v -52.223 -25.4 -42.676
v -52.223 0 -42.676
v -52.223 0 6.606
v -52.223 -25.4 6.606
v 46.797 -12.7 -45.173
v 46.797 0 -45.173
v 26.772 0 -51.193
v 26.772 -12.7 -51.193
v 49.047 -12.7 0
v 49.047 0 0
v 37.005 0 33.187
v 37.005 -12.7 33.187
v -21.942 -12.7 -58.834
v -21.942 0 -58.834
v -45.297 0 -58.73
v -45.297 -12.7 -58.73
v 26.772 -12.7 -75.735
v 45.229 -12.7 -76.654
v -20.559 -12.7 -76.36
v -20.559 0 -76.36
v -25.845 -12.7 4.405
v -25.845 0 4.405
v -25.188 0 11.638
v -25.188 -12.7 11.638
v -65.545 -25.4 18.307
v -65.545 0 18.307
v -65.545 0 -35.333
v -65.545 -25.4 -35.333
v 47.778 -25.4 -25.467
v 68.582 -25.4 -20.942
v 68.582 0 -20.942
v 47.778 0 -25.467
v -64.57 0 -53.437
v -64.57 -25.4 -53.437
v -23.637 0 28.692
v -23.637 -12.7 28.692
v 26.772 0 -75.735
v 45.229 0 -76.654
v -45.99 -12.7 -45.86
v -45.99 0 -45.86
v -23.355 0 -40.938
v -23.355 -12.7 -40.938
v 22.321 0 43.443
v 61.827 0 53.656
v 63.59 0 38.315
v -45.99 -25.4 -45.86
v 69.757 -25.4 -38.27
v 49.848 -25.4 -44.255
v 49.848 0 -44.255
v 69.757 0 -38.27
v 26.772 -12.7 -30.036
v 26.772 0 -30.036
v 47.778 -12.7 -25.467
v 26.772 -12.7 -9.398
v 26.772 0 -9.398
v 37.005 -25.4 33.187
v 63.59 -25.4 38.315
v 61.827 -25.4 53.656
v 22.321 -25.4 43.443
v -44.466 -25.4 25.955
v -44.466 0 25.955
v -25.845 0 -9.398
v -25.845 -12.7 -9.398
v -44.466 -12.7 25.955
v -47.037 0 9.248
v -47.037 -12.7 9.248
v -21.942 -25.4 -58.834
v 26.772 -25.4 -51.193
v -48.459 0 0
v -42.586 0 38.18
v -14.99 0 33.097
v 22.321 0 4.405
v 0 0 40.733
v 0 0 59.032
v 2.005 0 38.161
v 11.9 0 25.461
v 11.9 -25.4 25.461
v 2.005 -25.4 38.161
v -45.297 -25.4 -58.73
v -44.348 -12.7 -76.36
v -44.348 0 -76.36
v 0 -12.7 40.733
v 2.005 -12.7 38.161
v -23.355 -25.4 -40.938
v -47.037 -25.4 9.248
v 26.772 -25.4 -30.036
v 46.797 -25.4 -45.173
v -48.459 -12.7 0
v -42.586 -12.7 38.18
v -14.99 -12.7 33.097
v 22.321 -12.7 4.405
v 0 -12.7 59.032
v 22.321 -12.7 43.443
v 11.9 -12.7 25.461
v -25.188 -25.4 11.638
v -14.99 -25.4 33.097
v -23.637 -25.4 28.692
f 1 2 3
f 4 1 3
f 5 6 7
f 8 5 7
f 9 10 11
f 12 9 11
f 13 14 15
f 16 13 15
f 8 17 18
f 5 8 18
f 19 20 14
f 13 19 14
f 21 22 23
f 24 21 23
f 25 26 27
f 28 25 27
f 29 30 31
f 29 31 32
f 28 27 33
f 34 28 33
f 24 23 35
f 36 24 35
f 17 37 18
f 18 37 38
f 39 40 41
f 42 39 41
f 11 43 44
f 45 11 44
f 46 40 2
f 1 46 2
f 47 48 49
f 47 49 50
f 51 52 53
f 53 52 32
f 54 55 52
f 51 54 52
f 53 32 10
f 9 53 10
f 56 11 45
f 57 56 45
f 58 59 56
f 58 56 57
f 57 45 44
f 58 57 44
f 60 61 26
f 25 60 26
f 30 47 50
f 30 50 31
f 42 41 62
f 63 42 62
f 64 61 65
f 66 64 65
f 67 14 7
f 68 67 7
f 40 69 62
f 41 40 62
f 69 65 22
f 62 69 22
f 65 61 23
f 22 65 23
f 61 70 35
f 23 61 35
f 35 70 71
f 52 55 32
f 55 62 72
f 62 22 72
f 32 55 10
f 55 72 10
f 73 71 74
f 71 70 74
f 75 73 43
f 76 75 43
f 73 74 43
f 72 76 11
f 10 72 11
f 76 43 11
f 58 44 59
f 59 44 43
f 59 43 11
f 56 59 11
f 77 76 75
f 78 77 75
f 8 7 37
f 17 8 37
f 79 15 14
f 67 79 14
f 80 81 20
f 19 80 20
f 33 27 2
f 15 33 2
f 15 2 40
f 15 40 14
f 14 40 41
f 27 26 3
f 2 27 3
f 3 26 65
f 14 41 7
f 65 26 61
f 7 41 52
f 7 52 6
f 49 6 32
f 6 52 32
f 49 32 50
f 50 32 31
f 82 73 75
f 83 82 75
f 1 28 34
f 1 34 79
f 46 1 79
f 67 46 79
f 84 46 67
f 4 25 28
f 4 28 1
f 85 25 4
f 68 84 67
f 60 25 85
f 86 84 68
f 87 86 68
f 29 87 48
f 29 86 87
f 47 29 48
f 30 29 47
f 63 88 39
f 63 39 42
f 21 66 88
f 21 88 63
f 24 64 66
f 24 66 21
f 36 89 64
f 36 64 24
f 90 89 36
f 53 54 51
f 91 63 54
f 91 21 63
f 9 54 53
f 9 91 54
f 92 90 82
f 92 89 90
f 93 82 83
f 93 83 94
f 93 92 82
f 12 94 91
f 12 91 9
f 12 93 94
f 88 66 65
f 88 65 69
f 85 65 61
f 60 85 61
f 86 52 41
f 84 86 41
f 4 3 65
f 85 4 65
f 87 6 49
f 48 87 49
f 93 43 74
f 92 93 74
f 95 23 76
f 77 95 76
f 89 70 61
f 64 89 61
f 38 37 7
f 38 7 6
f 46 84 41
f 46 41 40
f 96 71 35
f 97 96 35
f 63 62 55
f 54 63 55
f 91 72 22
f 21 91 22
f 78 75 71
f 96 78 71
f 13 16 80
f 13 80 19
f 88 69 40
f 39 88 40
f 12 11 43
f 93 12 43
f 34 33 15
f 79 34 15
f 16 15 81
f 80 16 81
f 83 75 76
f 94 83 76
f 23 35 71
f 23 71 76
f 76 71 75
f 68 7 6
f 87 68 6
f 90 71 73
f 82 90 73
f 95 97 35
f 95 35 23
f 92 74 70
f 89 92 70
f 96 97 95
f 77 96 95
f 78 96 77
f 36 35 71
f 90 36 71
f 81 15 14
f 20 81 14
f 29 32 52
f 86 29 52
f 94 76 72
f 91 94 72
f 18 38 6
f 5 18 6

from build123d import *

# Parameters (mm, degrees)
F1_DEPTH = 25.4
F2_DEPTH = 12.7


with BuildPart() as f1:
    # F0 (on Front) → F1 (new body)
    with BuildSketch(Plane.XZ):
        Polygon((-52.223038, 6.606058), (-47.036587, 9.248163), (-44.466347, 25.954724), (-65.545018, 18.306712), (-65.545018, -35.333227), (-64.570178, -53.437405), (-45.297006, -58.729837), (-21.942178, -58.833978), (26.771875, -51.19266), (46.796787, -45.172647), (49.848274, -44.25529), (69.757149, -38.270161), (68.582371, -20.94226), (47.778299, -25.466913), (26.771875, -30.035576), (-23.355048, -40.937622), (-45.989972, -45.860466), (-52.223038, -42.675558), (-52.223038, -34.745838), (-52.223038, -17.417941), align=None)
        Polygon((-23.6373, 28.691895), (-25.187504, 11.638421), (11.899579, 25.46127), (2.004566, 38.160638), (-14.989507, 33.097294), align=None)
        Polygon((61.827425, 53.655818), (22.320686, 43.443285), (37.005346, 33.187333), (63.589588, 38.315309), align=None)
    extrude(amount=F1_DEPTH)


with BuildPart() as f2:
    # F0 (on Front) → F2 (new body)
    with BuildSketch(Plane.XZ):
        Polygon((-47.036587, 9.248163), (-48.459381, 0), (-45.989972, -45.860466), (-23.355048, -40.937622), (-25.845004, -9.398188), (26.771875, -9.398188), (26.771875, -30.035576), (47.778299, -25.466913), (49.046766, 0), (37.005346, 33.187333), (22.320686, 43.443285), (0, 59.032332), (-42.585518, 38.180113), (-44.466347, 25.954724), align=None)
        Polygon((22.320686, 4.405395), (-25.845004, 4.405395), (-25.187504, 11.638421), (-23.6373, 28.691895), (-14.989507, 33.097294), (0, 40.733319), (2.004566, 38.160638), (11.899579, 25.46127), align=None, mode=Mode.SUBTRACT)
        Polygon((46.796787, -45.172647), (26.771875, -51.19266), (26.771875, -75.734627), (45.228753, -76.653935), align=None)
        Polygon((-21.942178, -58.833978), (-45.297006, -58.729837), (-44.347677, -76.360241), (-20.558525, -76.360241), align=None)
    extrude(amount=F2_DEPTH)


solid = Compound([f1.part, f2.part])
